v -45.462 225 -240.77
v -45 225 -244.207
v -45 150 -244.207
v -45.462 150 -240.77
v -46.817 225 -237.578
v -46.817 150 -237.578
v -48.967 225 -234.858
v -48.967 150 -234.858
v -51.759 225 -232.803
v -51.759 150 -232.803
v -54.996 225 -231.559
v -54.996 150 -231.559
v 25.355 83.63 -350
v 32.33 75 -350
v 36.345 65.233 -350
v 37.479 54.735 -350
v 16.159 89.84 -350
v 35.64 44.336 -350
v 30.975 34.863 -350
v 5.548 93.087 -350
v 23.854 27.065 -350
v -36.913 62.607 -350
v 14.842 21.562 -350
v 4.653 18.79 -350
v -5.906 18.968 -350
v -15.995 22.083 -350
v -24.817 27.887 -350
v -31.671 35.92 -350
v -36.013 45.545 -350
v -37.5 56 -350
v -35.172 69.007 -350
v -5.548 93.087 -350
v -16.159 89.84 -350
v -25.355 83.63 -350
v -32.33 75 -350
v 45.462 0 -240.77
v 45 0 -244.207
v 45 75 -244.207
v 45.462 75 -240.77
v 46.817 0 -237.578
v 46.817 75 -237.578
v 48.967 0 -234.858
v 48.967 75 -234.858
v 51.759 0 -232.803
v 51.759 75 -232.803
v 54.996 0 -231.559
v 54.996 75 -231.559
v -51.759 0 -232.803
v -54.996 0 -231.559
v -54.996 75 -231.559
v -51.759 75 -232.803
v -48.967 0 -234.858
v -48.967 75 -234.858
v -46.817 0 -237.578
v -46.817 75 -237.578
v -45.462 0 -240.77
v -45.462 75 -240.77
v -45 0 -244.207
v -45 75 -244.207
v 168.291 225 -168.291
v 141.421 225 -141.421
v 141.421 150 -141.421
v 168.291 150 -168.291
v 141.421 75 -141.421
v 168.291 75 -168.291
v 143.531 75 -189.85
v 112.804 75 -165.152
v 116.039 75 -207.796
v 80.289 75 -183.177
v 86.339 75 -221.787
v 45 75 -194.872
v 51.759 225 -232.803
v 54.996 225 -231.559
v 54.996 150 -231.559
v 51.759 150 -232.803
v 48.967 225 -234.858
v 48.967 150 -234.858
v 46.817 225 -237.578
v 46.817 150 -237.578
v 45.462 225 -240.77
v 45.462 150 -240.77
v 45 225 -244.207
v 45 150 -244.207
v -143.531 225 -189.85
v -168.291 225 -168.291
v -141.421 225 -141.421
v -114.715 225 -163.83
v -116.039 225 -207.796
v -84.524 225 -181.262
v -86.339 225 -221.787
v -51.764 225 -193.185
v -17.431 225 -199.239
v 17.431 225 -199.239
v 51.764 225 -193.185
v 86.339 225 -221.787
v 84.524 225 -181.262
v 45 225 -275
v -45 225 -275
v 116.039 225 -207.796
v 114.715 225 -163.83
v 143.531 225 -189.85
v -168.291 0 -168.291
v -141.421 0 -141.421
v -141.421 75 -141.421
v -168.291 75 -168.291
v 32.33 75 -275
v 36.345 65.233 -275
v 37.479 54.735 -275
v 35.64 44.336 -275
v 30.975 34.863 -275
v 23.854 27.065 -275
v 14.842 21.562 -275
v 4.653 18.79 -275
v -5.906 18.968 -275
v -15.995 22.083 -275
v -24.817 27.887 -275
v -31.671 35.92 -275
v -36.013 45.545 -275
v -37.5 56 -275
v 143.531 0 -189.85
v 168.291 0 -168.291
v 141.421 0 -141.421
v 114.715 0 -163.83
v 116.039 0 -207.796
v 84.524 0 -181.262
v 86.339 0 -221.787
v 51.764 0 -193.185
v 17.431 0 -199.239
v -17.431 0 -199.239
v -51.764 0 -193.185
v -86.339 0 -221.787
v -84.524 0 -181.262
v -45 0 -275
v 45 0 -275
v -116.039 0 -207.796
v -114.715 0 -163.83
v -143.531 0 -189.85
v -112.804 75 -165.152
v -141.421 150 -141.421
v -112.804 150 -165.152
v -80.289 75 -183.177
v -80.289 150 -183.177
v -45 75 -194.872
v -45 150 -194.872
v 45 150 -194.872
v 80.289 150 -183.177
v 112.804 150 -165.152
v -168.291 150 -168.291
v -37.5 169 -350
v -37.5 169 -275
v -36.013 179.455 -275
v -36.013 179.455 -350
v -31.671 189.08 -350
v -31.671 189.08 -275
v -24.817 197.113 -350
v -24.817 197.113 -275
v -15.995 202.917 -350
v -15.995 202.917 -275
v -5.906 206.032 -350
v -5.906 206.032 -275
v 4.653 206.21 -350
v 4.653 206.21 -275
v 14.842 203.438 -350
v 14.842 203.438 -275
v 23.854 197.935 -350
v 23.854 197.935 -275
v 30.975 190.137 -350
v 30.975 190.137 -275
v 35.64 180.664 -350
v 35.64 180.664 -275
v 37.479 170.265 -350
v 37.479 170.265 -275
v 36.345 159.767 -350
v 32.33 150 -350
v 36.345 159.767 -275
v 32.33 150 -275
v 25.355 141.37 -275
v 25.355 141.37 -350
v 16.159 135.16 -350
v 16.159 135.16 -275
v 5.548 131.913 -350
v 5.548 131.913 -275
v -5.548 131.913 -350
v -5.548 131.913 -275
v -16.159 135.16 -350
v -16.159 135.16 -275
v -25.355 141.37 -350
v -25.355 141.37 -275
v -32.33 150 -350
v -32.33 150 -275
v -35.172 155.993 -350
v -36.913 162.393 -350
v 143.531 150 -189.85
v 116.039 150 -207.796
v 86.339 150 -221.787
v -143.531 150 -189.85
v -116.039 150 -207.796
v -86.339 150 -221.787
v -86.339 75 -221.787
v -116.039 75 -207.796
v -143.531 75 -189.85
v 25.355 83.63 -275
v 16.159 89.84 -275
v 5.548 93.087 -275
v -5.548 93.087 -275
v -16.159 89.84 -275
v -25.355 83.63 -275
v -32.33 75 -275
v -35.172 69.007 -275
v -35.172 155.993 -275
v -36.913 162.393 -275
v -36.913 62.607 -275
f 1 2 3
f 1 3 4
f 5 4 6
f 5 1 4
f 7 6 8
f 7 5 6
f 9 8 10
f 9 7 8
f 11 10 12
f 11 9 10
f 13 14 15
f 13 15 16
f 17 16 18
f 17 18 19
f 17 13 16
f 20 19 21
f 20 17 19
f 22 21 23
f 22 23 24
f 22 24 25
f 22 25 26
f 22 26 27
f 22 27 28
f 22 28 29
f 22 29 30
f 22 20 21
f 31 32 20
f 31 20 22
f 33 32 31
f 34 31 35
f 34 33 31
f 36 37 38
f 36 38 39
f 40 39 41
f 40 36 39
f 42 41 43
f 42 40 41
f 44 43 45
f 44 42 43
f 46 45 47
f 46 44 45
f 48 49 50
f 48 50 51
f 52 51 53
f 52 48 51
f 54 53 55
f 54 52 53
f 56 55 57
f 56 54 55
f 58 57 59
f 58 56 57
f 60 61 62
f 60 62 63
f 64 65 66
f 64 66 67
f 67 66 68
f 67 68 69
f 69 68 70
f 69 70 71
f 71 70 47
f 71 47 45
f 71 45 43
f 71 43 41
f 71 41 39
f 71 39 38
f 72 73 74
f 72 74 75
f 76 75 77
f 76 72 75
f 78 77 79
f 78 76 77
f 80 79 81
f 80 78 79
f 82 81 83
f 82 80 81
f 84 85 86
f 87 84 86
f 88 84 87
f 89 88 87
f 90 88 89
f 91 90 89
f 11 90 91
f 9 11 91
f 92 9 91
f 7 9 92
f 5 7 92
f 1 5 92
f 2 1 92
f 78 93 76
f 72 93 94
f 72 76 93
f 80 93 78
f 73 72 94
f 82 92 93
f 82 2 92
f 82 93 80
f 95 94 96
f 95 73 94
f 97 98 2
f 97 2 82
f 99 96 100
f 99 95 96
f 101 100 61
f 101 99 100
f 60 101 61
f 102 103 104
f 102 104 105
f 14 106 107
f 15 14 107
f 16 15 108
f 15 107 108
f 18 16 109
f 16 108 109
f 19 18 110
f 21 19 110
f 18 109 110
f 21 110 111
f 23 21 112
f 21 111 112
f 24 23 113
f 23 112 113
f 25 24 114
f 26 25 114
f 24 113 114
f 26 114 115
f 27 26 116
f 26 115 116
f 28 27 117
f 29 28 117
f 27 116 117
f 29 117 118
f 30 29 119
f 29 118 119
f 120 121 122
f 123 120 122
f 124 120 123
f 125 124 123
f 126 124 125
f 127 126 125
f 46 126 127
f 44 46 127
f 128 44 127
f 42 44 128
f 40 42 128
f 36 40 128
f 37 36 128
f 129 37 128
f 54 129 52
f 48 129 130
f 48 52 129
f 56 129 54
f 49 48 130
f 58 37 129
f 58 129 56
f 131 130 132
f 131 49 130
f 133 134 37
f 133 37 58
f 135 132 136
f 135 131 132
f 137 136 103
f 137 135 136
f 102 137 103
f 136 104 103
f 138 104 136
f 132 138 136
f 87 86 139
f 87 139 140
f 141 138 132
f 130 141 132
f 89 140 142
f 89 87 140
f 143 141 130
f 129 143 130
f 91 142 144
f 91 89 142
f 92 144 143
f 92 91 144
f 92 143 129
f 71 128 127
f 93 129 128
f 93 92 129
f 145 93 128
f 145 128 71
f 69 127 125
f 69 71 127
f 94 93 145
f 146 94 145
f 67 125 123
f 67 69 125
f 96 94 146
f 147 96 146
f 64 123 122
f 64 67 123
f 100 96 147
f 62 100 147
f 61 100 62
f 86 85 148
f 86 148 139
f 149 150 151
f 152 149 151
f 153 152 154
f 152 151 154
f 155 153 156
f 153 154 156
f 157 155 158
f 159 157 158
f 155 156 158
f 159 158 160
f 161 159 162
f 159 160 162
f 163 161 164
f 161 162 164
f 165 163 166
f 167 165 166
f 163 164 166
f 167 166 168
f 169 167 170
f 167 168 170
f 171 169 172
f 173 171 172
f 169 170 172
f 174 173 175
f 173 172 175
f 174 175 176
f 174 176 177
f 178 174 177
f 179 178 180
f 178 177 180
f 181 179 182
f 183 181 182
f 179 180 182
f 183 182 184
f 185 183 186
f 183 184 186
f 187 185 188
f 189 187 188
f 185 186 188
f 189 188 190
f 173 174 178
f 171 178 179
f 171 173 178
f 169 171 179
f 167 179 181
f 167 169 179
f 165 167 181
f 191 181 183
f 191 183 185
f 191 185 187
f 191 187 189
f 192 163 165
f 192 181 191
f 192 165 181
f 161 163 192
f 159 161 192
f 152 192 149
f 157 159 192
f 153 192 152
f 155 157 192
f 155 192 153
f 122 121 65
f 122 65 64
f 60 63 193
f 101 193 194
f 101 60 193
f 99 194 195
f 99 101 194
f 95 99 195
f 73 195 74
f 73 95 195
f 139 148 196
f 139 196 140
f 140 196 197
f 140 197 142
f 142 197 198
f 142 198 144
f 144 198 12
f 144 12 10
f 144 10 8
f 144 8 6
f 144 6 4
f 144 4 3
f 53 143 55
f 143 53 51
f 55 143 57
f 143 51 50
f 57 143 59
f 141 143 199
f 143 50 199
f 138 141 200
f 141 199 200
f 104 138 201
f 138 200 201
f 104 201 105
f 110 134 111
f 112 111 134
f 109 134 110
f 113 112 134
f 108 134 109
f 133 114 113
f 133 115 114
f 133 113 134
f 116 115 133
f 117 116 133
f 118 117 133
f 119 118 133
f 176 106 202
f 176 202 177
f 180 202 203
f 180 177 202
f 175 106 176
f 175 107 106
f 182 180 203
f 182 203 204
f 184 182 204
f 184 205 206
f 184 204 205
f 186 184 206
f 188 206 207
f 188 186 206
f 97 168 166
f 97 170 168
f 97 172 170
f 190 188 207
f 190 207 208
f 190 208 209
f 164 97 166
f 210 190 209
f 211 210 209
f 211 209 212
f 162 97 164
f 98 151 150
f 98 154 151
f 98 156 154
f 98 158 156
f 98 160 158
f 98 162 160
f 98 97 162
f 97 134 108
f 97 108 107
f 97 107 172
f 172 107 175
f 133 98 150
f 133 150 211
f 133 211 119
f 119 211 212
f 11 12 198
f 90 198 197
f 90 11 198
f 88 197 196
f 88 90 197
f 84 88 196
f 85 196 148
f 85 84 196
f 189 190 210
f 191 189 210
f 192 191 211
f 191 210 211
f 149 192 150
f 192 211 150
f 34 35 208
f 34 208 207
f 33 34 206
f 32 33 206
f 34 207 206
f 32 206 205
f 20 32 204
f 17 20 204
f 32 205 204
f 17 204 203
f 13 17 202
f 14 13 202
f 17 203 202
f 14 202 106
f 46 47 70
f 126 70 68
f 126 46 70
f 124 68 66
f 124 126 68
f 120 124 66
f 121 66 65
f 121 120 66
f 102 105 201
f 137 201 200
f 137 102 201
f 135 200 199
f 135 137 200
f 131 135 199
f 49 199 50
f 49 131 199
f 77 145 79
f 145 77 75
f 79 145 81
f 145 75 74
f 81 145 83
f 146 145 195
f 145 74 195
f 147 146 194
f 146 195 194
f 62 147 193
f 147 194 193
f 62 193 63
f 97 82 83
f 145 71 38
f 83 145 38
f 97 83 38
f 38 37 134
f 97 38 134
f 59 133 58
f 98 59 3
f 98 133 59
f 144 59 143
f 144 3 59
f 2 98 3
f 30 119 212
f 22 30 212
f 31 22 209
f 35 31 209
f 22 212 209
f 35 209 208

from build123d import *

# Parameters (mm, degrees)
BOSS_EXTRUDE1_DEPTH      = 75
BOSS_EXTRUDE2_START      = 225
BOSS_EXTRUDE2_DEPTH      = 75
BOSS_EXTRUDE4_REACH      = 313.111
BOSS_EXTRUDE4_END_RADIUS = 200
SKETCH4_W                = 90
SKETCH4_H                = 75
SKETCH4_6_R              = 37.5
BOSS_EXTRUDE5_DEPTH      = 75


with BuildPart() as part:
    # Sketch2 → Boss-Extrude1 (new body)
    with BuildSketch(Plane(origin=(0, 0, 0), x_dir=(1, 0, 0), z_dir=(0, 1, 0))):
        with BuildLine():
            ThreePointArc((-141.421356237, 141.421356237), (0, 200), (141.421356237, 141.421356237))
            Line((141.421356237, 141.421356237), (168.291413922, 168.291413922))
            ThreePointArc((168.291413922, 168.291413922), (116.038816401, 207.795555988), (54.996015936, 231.558714436))
            ThreePointArc((54.996015936, 231.558714436), (47.800691376, 236.146227949), (45, 244.20687951))
            Line((45, 244.20687951), (45, 275))
            Line((45, 275), (37.5, 275))
            Line((37.5, 275), (-37.5, 275))
            Line((-37.5, 275), (-45, 275))
            Line((-45, 275), (-45, 244.20687951))
            ThreePointArc((-45, 244.20687951), (-47.800691376, 236.146227949), (-54.996015936, 231.558714436))
            ThreePointArc((-54.996015936, 231.558714436), (-116.038816401, 207.795555988), (-168.291413922, 168.291413922))
            Line((-168.291413922, 168.291413922), (-141.421356237, 141.421356237))
        make_face()
    extrude(amount=BOSS_EXTRUDE1_DEPTH)



with BuildPart() as body_2:
    # Sketch2<3> → Boss-Extrude2 (new body)
    with BuildSketch(Plane(origin=(0, 0, 0), x_dir=(1, 0, 0), z_dir=(0, 1, 0)).offset(BOSS_EXTRUDE2_START)):
        with BuildLine():
            Line((141.421356237, 141.421356237), (168.291413922, 168.291413922))
            ThreePointArc((168.291413922, 168.291413922), (116.038816401, 207.795555988), (54.996015936, 231.558714436))
            ThreePointArc((54.996015936, 231.558714436), (47.800691376, 236.146227949), (45, 244.20687951))
            Line((45, 244.20687951), (45, 275))
            Line((45, 275), (-45, 275))
            Line((-45, 275), (-45, 244.20687951))
            ThreePointArc((-45, 244.20687951), (-47.800691376, 236.146227949), (-54.996015936, 231.558714436))
            ThreePointArc((-54.996015936, 231.558714436), (-116.038816401, 207.795555988), (-168.291413922, 168.291413922))
            Line((-168.291413922, 168.291413922), (-141.421356237, 141.421356237))
            ThreePointArc((-141.421356237, 141.421356237), (0, 200), (141.421356237, 141.421356237))
        make_face()
    extrude(amount=-BOSS_EXTRUDE2_DEPTH)


with BuildPart() as part_1:
    add(part.part)

    add(body_2.part)  # Boss-Extrude4 merges body 2
    # Boss-Extrude4: up to this cylinder (the profile starts outside it)
    boss_extrude4_end = Plane(origin=(0, 112.5, 0), z_dir=(0, 1, 0)) * Cylinder(BOSS_EXTRUDE4_END_RADIUS, 1027.222, mode=Mode.PRIVATE)
    # Sketch4 → Boss-Extrude4 (add, up to the surface)
    with BuildSketch(Plane(origin=(0, 0, -275), x_dir=(-1, 0, 0), z_dir=(0, 0, -1)), mode=Mode.PRIVATE) as boss_extrude4_sk1:
        with Locations((0, 112.5)):
            Rectangle(SKETCH4_W, SKETCH4_H)
    boss_extrude4_tool1 = extrude(boss_extrude4_sk1.sketch, amount=-BOSS_EXTRUDE4_REACH, mode=Mode.PRIVATE) - boss_extrude4_end
    add(boss_extrude4_tool1.solids().sort_by_distance((0, 112.5, -275))[0])

    # Sketch4<6> → Boss-Extrude5 (add)
    with BuildSketch(Plane(origin=(0, 0, -275), x_dir=(-1, 0, 0), z_dir=(0, 0, -1))):
        with Locations((0, 169)):
            Circle(SKETCH4_6_R)
        with Locations((0, 56)):
            Circle(SKETCH4_6_R)
    extrude(amount=BOSS_EXTRUDE5_DEPTH)


solid = part_1.part
